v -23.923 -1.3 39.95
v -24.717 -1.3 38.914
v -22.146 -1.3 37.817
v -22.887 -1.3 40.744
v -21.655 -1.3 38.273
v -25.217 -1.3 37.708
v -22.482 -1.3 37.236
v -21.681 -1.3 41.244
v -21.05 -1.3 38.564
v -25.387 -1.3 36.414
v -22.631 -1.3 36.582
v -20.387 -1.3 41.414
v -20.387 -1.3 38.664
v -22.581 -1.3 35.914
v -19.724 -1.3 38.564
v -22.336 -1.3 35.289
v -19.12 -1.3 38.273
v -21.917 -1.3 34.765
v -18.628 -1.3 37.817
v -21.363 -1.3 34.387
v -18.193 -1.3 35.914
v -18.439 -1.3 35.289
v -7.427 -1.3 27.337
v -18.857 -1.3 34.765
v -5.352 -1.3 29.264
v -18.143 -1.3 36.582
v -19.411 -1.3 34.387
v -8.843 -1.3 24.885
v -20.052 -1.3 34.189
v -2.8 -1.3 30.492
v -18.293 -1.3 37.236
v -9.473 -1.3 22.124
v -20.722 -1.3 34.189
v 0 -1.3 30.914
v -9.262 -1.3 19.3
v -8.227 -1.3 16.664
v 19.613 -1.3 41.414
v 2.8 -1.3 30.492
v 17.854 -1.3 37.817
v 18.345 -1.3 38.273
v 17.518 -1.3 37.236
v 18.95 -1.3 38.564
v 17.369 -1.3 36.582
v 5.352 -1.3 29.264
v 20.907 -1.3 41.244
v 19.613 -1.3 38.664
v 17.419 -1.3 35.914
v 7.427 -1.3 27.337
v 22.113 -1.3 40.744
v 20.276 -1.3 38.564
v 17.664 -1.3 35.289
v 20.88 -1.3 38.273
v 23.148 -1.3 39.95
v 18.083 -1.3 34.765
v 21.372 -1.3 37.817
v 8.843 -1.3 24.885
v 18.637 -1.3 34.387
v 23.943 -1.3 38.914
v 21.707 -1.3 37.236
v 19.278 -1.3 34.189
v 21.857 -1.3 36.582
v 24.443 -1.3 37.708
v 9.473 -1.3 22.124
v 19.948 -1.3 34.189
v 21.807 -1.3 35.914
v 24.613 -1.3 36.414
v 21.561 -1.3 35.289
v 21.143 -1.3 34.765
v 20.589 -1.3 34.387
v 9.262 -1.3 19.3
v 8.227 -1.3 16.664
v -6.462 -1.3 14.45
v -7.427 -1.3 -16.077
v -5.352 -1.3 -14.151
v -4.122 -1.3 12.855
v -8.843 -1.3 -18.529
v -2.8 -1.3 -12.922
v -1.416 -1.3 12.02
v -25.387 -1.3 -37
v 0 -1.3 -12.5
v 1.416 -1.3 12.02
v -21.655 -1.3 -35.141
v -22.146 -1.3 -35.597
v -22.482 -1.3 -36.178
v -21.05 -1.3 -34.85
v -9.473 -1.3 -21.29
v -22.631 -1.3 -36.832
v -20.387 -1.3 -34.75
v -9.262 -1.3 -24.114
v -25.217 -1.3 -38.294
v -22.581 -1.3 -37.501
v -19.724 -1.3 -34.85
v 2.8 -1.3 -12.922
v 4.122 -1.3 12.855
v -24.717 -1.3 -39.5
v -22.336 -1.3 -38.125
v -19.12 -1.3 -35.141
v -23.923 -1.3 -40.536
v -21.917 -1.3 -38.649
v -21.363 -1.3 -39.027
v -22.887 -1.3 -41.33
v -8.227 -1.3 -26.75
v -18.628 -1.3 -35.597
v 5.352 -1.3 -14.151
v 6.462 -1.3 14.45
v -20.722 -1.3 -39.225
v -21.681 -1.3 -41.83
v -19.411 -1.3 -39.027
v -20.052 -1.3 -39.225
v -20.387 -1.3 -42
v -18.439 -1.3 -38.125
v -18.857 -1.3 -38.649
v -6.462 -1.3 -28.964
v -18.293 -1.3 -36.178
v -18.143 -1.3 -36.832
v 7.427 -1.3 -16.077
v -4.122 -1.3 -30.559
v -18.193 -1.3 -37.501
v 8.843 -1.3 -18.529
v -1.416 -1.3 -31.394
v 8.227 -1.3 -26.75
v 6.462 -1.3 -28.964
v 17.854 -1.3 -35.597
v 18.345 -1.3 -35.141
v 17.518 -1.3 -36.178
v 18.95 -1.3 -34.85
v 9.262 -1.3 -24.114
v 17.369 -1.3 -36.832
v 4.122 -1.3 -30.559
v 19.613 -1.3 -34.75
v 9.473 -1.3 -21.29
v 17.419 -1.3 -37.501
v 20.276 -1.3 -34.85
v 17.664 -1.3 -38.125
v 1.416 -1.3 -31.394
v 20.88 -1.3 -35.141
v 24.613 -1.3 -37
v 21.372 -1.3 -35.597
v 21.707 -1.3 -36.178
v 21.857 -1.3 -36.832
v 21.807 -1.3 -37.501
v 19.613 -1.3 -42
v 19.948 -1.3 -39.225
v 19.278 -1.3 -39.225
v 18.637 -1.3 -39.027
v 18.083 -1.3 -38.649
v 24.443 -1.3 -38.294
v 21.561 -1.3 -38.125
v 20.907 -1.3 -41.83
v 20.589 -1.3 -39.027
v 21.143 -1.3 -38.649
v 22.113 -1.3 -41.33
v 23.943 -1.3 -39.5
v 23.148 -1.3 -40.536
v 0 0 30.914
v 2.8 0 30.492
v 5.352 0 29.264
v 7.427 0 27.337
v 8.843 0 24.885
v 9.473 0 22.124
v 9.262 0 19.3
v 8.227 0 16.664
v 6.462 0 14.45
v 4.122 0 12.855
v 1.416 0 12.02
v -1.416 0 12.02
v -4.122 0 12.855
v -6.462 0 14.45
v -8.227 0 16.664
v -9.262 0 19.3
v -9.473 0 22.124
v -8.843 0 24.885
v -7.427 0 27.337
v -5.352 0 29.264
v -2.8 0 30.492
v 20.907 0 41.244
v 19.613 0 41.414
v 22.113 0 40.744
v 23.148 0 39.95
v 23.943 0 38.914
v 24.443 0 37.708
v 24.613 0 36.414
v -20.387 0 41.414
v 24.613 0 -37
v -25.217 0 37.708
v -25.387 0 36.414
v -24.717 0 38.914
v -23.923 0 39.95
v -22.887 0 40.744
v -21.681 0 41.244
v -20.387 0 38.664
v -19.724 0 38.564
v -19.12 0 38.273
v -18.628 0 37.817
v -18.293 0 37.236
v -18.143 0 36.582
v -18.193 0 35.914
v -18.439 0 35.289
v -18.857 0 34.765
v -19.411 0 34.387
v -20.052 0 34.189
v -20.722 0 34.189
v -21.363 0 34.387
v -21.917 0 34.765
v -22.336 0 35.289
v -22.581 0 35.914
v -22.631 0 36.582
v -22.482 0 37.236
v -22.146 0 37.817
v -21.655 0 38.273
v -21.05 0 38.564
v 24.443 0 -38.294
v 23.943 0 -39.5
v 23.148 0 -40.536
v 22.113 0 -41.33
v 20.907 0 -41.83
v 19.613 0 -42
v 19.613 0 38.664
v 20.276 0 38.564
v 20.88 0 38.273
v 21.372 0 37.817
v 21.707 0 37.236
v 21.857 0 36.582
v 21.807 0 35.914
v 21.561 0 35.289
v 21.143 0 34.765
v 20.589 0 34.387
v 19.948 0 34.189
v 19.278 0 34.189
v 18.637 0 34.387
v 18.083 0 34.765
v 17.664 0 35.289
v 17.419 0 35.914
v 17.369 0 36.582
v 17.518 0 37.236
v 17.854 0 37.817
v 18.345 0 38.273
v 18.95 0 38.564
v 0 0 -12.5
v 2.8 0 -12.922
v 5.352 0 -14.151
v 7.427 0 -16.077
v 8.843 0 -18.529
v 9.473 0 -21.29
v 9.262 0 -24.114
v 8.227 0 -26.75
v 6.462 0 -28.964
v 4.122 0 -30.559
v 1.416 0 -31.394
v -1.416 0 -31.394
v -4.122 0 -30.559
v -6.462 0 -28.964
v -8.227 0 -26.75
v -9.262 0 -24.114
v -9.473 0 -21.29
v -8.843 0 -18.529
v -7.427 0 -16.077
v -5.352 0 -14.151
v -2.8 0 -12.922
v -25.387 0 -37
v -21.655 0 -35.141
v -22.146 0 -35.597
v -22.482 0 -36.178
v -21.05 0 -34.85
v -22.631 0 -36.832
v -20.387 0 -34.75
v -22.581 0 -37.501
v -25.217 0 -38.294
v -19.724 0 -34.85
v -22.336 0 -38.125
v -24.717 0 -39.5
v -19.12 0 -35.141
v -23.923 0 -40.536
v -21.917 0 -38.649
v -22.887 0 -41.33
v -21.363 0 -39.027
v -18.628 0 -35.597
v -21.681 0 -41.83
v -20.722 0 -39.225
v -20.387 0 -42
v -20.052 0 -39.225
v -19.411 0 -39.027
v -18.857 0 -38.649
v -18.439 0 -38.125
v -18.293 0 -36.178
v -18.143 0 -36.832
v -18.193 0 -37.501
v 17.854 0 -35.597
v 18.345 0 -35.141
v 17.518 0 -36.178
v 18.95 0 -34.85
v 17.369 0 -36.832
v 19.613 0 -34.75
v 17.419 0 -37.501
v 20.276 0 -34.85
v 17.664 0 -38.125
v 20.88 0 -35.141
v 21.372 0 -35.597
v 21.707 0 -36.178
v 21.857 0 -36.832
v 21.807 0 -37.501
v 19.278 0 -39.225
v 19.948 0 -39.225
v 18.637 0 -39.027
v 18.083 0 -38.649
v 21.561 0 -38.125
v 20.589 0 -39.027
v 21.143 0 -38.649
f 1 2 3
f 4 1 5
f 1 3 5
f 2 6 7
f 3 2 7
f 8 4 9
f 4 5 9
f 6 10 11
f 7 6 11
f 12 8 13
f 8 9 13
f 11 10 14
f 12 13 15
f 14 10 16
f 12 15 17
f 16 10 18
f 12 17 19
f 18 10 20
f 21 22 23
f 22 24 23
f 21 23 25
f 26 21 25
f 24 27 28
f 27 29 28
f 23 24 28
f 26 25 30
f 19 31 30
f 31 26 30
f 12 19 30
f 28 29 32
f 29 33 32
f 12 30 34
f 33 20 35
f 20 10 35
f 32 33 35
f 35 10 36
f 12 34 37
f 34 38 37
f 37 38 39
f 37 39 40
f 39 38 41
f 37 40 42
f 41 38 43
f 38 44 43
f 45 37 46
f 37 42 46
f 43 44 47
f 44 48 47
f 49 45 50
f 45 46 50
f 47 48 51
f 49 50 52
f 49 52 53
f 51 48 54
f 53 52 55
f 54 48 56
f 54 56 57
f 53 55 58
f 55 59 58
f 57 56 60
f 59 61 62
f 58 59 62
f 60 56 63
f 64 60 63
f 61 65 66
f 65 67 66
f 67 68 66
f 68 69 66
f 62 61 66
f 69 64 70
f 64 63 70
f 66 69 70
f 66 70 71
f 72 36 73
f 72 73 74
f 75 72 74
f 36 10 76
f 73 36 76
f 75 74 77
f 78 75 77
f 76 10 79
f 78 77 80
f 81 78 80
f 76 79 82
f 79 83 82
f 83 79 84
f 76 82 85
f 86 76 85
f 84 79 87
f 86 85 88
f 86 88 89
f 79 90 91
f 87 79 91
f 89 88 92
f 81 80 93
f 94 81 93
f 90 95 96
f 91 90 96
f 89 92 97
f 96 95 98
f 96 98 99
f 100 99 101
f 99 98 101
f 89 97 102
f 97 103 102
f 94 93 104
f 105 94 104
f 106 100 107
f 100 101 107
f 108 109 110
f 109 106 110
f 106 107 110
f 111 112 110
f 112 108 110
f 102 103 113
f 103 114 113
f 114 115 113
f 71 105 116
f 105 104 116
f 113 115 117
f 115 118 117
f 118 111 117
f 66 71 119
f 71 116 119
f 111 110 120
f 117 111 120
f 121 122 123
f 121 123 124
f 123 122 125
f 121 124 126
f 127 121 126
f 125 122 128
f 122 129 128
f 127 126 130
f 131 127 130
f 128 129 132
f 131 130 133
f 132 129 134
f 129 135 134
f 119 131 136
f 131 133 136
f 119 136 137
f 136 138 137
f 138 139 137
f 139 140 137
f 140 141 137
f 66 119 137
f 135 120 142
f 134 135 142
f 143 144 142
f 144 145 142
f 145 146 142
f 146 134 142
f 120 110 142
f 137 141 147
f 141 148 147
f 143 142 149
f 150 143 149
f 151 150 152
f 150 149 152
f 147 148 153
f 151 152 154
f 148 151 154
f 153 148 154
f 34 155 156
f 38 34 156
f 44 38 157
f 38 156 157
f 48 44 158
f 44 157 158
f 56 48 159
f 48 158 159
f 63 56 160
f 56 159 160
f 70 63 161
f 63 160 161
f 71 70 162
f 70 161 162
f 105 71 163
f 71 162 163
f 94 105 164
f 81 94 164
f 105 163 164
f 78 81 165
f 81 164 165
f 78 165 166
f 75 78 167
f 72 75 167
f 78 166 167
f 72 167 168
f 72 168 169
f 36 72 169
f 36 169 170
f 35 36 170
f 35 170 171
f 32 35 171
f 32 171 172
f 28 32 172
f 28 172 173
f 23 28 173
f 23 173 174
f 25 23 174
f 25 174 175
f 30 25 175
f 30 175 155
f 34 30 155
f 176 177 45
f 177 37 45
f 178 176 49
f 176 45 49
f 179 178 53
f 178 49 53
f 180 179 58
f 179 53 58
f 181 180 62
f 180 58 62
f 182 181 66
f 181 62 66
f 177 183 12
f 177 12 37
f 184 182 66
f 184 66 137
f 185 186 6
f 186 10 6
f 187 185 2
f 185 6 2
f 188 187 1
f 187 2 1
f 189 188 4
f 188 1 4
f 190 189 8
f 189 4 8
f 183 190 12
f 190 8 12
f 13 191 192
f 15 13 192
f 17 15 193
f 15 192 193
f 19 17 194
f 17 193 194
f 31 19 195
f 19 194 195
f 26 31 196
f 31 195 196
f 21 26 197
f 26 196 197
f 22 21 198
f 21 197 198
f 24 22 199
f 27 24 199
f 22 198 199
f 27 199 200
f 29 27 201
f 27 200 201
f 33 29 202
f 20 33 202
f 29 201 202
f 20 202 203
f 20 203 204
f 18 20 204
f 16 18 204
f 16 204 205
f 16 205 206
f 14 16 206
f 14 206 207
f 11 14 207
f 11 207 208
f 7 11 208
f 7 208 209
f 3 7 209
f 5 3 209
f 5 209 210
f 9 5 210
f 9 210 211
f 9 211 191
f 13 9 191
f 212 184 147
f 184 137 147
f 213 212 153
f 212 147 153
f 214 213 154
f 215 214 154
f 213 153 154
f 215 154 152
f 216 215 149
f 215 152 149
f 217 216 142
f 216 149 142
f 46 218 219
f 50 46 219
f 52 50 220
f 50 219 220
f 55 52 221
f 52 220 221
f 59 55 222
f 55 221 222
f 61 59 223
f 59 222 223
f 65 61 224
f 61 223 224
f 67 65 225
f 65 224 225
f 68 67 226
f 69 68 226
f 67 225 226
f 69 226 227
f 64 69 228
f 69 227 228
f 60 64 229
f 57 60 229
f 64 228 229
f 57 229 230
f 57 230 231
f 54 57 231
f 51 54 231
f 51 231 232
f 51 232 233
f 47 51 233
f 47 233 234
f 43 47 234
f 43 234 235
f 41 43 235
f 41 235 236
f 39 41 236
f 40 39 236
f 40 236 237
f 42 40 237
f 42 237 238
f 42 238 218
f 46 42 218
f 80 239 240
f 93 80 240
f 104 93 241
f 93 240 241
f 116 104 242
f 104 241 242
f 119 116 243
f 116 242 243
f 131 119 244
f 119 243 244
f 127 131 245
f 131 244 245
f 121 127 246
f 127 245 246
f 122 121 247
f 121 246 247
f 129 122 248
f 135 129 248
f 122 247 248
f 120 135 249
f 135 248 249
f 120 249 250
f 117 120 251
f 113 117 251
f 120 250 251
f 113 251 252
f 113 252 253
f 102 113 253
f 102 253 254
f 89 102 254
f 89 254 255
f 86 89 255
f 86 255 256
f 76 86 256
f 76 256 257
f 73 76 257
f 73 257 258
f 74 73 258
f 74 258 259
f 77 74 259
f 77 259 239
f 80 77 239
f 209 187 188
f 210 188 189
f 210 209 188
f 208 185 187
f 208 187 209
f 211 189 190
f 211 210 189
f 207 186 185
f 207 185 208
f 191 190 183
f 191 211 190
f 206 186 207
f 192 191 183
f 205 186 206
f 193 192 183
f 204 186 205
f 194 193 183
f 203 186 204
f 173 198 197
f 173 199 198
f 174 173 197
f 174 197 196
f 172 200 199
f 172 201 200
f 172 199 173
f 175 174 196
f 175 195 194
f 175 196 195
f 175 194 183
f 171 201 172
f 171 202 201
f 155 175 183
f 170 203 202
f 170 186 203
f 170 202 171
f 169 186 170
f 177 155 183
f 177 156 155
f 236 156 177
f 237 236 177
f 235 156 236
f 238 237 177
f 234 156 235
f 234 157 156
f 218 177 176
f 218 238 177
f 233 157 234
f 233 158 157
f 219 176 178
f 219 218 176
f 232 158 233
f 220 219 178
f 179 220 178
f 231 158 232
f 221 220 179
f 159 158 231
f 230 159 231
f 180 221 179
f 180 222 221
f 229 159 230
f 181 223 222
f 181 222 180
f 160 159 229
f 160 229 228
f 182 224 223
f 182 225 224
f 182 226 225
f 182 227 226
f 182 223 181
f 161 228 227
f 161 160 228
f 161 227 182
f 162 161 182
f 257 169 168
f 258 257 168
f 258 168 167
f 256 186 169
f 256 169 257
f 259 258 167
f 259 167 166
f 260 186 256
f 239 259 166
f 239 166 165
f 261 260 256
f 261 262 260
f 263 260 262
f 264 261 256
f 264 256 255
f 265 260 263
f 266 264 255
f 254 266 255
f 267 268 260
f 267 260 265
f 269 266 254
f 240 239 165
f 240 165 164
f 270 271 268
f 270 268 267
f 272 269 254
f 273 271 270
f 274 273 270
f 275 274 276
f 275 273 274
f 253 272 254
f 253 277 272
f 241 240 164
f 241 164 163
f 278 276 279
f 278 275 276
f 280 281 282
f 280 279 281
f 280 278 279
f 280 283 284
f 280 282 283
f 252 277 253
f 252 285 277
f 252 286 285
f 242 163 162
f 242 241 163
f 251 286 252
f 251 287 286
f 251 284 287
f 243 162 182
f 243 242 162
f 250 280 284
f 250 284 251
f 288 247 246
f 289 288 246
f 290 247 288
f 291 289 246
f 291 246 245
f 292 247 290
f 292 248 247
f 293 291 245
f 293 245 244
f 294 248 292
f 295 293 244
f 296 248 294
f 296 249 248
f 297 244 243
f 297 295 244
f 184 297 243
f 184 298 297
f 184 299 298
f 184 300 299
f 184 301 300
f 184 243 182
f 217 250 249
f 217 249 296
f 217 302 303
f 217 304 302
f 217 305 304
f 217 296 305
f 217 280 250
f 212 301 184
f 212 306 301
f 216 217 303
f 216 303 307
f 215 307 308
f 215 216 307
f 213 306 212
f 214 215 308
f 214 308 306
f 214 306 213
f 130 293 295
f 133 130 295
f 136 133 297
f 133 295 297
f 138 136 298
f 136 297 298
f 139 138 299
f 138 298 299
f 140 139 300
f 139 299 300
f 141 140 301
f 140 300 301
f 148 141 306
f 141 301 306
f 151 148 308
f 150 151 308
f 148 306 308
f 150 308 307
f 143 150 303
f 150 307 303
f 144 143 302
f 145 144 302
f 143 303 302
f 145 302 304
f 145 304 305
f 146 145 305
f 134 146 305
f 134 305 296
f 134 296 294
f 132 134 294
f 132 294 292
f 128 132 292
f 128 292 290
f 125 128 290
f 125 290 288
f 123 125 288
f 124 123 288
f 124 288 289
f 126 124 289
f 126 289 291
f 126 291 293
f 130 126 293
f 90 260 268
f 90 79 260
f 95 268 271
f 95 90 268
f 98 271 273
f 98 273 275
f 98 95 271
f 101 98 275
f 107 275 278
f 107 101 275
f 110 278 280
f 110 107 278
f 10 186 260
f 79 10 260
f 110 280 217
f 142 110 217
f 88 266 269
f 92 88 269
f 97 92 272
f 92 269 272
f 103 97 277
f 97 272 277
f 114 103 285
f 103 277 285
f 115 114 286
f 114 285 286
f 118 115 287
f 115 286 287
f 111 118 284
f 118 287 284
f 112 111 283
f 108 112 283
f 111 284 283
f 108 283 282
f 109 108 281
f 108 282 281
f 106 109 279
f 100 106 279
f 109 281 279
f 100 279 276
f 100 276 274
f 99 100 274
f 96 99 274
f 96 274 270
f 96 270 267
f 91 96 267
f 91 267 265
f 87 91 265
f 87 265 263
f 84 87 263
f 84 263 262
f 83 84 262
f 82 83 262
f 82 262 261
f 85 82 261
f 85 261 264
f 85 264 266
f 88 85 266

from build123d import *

# Parameters (mm, degrees)
SKETCH1_W          = 50
SKETCH1_H          = 83.414309181
BASE_FLANGE1_DEPTH = 1.3
FILLET1_R          = 5
SKETCH6_R          = 9.5
CUT_EXTRUDE1_DEPTH = 10
SKETCH7_R          = 2.25
CUT_EXTRUDE2_DEPTH = 10


# Sheet-metal steps are written as plain solids
with BuildPart() as part:
    # Sketch1 → Base-Flange1 (new body)
    with BuildSketch(Plane(origin=(0, 0, 0), x_dir=(1, 0, 0), z_dir=(0, 1, 0))):
        with Locations((-0.387063477, 0.292845409)):
            Rectangle(SKETCH1_W, SKETCH1_H)
    extrude(amount=-BASE_FLANGE1_DEPTH)

    # Fillet1
    fillet1_edges = [part.edges().sort_by_distance(p)[0] for p in [
        (24.612936523, -0.65, 41.414309181),
        (-25.387063477, -0.65, 41.414309181),
        (-25.387063477, -0.65, -42),
        (24.612936523, -0.65, -42),
    ]]
    fillet(fillet1_edges, radius=FILLET1_R)

    # Sketch6 → Cut-Extrude1 (cut)
    with BuildSketch(Plane(origin=(0, 0, 0), x_dir=(1, 0, 0), z_dir=(0, 1, 0))):
        with Locations(Location((0, 22, 0), (0, 0, 270))):
            Circle(SKETCH6_R)
        with Locations(Location((0, -21.414309181, 0), (0, 0, 270))):
            Circle(SKETCH6_R)
    extrude(amount=-CUT_EXTRUDE1_DEPTH, mode=Mode.SUBTRACT)

    # Sketch7 → Cut-Extrude2 (cut)
    with BuildSketch(Plane(origin=(0, 0, 0), x_dir=(1, 0, 0), z_dir=(0, 1, 0))):
        with Locations(Location((19.612936523, 37, 0), (0, 0, 270))):
            Circle(SKETCH7_R)
        with Locations(Location((-20.387063477, 37, 0), (0, 0, 270))):
            Circle(SKETCH7_R)
        with Locations(Location((-20.387063477, -36.414309181, 0), (0, 0, 270))):
            Circle(SKETCH7_R)
        with Locations(Location((19.612936523, -36.414309181, 0), (0, 0, 270))):
            Circle(SKETCH7_R)
    extrude(amount=-CUT_EXTRUDE2_DEPTH, mode=Mode.SUBTRACT)


solid = part.part
